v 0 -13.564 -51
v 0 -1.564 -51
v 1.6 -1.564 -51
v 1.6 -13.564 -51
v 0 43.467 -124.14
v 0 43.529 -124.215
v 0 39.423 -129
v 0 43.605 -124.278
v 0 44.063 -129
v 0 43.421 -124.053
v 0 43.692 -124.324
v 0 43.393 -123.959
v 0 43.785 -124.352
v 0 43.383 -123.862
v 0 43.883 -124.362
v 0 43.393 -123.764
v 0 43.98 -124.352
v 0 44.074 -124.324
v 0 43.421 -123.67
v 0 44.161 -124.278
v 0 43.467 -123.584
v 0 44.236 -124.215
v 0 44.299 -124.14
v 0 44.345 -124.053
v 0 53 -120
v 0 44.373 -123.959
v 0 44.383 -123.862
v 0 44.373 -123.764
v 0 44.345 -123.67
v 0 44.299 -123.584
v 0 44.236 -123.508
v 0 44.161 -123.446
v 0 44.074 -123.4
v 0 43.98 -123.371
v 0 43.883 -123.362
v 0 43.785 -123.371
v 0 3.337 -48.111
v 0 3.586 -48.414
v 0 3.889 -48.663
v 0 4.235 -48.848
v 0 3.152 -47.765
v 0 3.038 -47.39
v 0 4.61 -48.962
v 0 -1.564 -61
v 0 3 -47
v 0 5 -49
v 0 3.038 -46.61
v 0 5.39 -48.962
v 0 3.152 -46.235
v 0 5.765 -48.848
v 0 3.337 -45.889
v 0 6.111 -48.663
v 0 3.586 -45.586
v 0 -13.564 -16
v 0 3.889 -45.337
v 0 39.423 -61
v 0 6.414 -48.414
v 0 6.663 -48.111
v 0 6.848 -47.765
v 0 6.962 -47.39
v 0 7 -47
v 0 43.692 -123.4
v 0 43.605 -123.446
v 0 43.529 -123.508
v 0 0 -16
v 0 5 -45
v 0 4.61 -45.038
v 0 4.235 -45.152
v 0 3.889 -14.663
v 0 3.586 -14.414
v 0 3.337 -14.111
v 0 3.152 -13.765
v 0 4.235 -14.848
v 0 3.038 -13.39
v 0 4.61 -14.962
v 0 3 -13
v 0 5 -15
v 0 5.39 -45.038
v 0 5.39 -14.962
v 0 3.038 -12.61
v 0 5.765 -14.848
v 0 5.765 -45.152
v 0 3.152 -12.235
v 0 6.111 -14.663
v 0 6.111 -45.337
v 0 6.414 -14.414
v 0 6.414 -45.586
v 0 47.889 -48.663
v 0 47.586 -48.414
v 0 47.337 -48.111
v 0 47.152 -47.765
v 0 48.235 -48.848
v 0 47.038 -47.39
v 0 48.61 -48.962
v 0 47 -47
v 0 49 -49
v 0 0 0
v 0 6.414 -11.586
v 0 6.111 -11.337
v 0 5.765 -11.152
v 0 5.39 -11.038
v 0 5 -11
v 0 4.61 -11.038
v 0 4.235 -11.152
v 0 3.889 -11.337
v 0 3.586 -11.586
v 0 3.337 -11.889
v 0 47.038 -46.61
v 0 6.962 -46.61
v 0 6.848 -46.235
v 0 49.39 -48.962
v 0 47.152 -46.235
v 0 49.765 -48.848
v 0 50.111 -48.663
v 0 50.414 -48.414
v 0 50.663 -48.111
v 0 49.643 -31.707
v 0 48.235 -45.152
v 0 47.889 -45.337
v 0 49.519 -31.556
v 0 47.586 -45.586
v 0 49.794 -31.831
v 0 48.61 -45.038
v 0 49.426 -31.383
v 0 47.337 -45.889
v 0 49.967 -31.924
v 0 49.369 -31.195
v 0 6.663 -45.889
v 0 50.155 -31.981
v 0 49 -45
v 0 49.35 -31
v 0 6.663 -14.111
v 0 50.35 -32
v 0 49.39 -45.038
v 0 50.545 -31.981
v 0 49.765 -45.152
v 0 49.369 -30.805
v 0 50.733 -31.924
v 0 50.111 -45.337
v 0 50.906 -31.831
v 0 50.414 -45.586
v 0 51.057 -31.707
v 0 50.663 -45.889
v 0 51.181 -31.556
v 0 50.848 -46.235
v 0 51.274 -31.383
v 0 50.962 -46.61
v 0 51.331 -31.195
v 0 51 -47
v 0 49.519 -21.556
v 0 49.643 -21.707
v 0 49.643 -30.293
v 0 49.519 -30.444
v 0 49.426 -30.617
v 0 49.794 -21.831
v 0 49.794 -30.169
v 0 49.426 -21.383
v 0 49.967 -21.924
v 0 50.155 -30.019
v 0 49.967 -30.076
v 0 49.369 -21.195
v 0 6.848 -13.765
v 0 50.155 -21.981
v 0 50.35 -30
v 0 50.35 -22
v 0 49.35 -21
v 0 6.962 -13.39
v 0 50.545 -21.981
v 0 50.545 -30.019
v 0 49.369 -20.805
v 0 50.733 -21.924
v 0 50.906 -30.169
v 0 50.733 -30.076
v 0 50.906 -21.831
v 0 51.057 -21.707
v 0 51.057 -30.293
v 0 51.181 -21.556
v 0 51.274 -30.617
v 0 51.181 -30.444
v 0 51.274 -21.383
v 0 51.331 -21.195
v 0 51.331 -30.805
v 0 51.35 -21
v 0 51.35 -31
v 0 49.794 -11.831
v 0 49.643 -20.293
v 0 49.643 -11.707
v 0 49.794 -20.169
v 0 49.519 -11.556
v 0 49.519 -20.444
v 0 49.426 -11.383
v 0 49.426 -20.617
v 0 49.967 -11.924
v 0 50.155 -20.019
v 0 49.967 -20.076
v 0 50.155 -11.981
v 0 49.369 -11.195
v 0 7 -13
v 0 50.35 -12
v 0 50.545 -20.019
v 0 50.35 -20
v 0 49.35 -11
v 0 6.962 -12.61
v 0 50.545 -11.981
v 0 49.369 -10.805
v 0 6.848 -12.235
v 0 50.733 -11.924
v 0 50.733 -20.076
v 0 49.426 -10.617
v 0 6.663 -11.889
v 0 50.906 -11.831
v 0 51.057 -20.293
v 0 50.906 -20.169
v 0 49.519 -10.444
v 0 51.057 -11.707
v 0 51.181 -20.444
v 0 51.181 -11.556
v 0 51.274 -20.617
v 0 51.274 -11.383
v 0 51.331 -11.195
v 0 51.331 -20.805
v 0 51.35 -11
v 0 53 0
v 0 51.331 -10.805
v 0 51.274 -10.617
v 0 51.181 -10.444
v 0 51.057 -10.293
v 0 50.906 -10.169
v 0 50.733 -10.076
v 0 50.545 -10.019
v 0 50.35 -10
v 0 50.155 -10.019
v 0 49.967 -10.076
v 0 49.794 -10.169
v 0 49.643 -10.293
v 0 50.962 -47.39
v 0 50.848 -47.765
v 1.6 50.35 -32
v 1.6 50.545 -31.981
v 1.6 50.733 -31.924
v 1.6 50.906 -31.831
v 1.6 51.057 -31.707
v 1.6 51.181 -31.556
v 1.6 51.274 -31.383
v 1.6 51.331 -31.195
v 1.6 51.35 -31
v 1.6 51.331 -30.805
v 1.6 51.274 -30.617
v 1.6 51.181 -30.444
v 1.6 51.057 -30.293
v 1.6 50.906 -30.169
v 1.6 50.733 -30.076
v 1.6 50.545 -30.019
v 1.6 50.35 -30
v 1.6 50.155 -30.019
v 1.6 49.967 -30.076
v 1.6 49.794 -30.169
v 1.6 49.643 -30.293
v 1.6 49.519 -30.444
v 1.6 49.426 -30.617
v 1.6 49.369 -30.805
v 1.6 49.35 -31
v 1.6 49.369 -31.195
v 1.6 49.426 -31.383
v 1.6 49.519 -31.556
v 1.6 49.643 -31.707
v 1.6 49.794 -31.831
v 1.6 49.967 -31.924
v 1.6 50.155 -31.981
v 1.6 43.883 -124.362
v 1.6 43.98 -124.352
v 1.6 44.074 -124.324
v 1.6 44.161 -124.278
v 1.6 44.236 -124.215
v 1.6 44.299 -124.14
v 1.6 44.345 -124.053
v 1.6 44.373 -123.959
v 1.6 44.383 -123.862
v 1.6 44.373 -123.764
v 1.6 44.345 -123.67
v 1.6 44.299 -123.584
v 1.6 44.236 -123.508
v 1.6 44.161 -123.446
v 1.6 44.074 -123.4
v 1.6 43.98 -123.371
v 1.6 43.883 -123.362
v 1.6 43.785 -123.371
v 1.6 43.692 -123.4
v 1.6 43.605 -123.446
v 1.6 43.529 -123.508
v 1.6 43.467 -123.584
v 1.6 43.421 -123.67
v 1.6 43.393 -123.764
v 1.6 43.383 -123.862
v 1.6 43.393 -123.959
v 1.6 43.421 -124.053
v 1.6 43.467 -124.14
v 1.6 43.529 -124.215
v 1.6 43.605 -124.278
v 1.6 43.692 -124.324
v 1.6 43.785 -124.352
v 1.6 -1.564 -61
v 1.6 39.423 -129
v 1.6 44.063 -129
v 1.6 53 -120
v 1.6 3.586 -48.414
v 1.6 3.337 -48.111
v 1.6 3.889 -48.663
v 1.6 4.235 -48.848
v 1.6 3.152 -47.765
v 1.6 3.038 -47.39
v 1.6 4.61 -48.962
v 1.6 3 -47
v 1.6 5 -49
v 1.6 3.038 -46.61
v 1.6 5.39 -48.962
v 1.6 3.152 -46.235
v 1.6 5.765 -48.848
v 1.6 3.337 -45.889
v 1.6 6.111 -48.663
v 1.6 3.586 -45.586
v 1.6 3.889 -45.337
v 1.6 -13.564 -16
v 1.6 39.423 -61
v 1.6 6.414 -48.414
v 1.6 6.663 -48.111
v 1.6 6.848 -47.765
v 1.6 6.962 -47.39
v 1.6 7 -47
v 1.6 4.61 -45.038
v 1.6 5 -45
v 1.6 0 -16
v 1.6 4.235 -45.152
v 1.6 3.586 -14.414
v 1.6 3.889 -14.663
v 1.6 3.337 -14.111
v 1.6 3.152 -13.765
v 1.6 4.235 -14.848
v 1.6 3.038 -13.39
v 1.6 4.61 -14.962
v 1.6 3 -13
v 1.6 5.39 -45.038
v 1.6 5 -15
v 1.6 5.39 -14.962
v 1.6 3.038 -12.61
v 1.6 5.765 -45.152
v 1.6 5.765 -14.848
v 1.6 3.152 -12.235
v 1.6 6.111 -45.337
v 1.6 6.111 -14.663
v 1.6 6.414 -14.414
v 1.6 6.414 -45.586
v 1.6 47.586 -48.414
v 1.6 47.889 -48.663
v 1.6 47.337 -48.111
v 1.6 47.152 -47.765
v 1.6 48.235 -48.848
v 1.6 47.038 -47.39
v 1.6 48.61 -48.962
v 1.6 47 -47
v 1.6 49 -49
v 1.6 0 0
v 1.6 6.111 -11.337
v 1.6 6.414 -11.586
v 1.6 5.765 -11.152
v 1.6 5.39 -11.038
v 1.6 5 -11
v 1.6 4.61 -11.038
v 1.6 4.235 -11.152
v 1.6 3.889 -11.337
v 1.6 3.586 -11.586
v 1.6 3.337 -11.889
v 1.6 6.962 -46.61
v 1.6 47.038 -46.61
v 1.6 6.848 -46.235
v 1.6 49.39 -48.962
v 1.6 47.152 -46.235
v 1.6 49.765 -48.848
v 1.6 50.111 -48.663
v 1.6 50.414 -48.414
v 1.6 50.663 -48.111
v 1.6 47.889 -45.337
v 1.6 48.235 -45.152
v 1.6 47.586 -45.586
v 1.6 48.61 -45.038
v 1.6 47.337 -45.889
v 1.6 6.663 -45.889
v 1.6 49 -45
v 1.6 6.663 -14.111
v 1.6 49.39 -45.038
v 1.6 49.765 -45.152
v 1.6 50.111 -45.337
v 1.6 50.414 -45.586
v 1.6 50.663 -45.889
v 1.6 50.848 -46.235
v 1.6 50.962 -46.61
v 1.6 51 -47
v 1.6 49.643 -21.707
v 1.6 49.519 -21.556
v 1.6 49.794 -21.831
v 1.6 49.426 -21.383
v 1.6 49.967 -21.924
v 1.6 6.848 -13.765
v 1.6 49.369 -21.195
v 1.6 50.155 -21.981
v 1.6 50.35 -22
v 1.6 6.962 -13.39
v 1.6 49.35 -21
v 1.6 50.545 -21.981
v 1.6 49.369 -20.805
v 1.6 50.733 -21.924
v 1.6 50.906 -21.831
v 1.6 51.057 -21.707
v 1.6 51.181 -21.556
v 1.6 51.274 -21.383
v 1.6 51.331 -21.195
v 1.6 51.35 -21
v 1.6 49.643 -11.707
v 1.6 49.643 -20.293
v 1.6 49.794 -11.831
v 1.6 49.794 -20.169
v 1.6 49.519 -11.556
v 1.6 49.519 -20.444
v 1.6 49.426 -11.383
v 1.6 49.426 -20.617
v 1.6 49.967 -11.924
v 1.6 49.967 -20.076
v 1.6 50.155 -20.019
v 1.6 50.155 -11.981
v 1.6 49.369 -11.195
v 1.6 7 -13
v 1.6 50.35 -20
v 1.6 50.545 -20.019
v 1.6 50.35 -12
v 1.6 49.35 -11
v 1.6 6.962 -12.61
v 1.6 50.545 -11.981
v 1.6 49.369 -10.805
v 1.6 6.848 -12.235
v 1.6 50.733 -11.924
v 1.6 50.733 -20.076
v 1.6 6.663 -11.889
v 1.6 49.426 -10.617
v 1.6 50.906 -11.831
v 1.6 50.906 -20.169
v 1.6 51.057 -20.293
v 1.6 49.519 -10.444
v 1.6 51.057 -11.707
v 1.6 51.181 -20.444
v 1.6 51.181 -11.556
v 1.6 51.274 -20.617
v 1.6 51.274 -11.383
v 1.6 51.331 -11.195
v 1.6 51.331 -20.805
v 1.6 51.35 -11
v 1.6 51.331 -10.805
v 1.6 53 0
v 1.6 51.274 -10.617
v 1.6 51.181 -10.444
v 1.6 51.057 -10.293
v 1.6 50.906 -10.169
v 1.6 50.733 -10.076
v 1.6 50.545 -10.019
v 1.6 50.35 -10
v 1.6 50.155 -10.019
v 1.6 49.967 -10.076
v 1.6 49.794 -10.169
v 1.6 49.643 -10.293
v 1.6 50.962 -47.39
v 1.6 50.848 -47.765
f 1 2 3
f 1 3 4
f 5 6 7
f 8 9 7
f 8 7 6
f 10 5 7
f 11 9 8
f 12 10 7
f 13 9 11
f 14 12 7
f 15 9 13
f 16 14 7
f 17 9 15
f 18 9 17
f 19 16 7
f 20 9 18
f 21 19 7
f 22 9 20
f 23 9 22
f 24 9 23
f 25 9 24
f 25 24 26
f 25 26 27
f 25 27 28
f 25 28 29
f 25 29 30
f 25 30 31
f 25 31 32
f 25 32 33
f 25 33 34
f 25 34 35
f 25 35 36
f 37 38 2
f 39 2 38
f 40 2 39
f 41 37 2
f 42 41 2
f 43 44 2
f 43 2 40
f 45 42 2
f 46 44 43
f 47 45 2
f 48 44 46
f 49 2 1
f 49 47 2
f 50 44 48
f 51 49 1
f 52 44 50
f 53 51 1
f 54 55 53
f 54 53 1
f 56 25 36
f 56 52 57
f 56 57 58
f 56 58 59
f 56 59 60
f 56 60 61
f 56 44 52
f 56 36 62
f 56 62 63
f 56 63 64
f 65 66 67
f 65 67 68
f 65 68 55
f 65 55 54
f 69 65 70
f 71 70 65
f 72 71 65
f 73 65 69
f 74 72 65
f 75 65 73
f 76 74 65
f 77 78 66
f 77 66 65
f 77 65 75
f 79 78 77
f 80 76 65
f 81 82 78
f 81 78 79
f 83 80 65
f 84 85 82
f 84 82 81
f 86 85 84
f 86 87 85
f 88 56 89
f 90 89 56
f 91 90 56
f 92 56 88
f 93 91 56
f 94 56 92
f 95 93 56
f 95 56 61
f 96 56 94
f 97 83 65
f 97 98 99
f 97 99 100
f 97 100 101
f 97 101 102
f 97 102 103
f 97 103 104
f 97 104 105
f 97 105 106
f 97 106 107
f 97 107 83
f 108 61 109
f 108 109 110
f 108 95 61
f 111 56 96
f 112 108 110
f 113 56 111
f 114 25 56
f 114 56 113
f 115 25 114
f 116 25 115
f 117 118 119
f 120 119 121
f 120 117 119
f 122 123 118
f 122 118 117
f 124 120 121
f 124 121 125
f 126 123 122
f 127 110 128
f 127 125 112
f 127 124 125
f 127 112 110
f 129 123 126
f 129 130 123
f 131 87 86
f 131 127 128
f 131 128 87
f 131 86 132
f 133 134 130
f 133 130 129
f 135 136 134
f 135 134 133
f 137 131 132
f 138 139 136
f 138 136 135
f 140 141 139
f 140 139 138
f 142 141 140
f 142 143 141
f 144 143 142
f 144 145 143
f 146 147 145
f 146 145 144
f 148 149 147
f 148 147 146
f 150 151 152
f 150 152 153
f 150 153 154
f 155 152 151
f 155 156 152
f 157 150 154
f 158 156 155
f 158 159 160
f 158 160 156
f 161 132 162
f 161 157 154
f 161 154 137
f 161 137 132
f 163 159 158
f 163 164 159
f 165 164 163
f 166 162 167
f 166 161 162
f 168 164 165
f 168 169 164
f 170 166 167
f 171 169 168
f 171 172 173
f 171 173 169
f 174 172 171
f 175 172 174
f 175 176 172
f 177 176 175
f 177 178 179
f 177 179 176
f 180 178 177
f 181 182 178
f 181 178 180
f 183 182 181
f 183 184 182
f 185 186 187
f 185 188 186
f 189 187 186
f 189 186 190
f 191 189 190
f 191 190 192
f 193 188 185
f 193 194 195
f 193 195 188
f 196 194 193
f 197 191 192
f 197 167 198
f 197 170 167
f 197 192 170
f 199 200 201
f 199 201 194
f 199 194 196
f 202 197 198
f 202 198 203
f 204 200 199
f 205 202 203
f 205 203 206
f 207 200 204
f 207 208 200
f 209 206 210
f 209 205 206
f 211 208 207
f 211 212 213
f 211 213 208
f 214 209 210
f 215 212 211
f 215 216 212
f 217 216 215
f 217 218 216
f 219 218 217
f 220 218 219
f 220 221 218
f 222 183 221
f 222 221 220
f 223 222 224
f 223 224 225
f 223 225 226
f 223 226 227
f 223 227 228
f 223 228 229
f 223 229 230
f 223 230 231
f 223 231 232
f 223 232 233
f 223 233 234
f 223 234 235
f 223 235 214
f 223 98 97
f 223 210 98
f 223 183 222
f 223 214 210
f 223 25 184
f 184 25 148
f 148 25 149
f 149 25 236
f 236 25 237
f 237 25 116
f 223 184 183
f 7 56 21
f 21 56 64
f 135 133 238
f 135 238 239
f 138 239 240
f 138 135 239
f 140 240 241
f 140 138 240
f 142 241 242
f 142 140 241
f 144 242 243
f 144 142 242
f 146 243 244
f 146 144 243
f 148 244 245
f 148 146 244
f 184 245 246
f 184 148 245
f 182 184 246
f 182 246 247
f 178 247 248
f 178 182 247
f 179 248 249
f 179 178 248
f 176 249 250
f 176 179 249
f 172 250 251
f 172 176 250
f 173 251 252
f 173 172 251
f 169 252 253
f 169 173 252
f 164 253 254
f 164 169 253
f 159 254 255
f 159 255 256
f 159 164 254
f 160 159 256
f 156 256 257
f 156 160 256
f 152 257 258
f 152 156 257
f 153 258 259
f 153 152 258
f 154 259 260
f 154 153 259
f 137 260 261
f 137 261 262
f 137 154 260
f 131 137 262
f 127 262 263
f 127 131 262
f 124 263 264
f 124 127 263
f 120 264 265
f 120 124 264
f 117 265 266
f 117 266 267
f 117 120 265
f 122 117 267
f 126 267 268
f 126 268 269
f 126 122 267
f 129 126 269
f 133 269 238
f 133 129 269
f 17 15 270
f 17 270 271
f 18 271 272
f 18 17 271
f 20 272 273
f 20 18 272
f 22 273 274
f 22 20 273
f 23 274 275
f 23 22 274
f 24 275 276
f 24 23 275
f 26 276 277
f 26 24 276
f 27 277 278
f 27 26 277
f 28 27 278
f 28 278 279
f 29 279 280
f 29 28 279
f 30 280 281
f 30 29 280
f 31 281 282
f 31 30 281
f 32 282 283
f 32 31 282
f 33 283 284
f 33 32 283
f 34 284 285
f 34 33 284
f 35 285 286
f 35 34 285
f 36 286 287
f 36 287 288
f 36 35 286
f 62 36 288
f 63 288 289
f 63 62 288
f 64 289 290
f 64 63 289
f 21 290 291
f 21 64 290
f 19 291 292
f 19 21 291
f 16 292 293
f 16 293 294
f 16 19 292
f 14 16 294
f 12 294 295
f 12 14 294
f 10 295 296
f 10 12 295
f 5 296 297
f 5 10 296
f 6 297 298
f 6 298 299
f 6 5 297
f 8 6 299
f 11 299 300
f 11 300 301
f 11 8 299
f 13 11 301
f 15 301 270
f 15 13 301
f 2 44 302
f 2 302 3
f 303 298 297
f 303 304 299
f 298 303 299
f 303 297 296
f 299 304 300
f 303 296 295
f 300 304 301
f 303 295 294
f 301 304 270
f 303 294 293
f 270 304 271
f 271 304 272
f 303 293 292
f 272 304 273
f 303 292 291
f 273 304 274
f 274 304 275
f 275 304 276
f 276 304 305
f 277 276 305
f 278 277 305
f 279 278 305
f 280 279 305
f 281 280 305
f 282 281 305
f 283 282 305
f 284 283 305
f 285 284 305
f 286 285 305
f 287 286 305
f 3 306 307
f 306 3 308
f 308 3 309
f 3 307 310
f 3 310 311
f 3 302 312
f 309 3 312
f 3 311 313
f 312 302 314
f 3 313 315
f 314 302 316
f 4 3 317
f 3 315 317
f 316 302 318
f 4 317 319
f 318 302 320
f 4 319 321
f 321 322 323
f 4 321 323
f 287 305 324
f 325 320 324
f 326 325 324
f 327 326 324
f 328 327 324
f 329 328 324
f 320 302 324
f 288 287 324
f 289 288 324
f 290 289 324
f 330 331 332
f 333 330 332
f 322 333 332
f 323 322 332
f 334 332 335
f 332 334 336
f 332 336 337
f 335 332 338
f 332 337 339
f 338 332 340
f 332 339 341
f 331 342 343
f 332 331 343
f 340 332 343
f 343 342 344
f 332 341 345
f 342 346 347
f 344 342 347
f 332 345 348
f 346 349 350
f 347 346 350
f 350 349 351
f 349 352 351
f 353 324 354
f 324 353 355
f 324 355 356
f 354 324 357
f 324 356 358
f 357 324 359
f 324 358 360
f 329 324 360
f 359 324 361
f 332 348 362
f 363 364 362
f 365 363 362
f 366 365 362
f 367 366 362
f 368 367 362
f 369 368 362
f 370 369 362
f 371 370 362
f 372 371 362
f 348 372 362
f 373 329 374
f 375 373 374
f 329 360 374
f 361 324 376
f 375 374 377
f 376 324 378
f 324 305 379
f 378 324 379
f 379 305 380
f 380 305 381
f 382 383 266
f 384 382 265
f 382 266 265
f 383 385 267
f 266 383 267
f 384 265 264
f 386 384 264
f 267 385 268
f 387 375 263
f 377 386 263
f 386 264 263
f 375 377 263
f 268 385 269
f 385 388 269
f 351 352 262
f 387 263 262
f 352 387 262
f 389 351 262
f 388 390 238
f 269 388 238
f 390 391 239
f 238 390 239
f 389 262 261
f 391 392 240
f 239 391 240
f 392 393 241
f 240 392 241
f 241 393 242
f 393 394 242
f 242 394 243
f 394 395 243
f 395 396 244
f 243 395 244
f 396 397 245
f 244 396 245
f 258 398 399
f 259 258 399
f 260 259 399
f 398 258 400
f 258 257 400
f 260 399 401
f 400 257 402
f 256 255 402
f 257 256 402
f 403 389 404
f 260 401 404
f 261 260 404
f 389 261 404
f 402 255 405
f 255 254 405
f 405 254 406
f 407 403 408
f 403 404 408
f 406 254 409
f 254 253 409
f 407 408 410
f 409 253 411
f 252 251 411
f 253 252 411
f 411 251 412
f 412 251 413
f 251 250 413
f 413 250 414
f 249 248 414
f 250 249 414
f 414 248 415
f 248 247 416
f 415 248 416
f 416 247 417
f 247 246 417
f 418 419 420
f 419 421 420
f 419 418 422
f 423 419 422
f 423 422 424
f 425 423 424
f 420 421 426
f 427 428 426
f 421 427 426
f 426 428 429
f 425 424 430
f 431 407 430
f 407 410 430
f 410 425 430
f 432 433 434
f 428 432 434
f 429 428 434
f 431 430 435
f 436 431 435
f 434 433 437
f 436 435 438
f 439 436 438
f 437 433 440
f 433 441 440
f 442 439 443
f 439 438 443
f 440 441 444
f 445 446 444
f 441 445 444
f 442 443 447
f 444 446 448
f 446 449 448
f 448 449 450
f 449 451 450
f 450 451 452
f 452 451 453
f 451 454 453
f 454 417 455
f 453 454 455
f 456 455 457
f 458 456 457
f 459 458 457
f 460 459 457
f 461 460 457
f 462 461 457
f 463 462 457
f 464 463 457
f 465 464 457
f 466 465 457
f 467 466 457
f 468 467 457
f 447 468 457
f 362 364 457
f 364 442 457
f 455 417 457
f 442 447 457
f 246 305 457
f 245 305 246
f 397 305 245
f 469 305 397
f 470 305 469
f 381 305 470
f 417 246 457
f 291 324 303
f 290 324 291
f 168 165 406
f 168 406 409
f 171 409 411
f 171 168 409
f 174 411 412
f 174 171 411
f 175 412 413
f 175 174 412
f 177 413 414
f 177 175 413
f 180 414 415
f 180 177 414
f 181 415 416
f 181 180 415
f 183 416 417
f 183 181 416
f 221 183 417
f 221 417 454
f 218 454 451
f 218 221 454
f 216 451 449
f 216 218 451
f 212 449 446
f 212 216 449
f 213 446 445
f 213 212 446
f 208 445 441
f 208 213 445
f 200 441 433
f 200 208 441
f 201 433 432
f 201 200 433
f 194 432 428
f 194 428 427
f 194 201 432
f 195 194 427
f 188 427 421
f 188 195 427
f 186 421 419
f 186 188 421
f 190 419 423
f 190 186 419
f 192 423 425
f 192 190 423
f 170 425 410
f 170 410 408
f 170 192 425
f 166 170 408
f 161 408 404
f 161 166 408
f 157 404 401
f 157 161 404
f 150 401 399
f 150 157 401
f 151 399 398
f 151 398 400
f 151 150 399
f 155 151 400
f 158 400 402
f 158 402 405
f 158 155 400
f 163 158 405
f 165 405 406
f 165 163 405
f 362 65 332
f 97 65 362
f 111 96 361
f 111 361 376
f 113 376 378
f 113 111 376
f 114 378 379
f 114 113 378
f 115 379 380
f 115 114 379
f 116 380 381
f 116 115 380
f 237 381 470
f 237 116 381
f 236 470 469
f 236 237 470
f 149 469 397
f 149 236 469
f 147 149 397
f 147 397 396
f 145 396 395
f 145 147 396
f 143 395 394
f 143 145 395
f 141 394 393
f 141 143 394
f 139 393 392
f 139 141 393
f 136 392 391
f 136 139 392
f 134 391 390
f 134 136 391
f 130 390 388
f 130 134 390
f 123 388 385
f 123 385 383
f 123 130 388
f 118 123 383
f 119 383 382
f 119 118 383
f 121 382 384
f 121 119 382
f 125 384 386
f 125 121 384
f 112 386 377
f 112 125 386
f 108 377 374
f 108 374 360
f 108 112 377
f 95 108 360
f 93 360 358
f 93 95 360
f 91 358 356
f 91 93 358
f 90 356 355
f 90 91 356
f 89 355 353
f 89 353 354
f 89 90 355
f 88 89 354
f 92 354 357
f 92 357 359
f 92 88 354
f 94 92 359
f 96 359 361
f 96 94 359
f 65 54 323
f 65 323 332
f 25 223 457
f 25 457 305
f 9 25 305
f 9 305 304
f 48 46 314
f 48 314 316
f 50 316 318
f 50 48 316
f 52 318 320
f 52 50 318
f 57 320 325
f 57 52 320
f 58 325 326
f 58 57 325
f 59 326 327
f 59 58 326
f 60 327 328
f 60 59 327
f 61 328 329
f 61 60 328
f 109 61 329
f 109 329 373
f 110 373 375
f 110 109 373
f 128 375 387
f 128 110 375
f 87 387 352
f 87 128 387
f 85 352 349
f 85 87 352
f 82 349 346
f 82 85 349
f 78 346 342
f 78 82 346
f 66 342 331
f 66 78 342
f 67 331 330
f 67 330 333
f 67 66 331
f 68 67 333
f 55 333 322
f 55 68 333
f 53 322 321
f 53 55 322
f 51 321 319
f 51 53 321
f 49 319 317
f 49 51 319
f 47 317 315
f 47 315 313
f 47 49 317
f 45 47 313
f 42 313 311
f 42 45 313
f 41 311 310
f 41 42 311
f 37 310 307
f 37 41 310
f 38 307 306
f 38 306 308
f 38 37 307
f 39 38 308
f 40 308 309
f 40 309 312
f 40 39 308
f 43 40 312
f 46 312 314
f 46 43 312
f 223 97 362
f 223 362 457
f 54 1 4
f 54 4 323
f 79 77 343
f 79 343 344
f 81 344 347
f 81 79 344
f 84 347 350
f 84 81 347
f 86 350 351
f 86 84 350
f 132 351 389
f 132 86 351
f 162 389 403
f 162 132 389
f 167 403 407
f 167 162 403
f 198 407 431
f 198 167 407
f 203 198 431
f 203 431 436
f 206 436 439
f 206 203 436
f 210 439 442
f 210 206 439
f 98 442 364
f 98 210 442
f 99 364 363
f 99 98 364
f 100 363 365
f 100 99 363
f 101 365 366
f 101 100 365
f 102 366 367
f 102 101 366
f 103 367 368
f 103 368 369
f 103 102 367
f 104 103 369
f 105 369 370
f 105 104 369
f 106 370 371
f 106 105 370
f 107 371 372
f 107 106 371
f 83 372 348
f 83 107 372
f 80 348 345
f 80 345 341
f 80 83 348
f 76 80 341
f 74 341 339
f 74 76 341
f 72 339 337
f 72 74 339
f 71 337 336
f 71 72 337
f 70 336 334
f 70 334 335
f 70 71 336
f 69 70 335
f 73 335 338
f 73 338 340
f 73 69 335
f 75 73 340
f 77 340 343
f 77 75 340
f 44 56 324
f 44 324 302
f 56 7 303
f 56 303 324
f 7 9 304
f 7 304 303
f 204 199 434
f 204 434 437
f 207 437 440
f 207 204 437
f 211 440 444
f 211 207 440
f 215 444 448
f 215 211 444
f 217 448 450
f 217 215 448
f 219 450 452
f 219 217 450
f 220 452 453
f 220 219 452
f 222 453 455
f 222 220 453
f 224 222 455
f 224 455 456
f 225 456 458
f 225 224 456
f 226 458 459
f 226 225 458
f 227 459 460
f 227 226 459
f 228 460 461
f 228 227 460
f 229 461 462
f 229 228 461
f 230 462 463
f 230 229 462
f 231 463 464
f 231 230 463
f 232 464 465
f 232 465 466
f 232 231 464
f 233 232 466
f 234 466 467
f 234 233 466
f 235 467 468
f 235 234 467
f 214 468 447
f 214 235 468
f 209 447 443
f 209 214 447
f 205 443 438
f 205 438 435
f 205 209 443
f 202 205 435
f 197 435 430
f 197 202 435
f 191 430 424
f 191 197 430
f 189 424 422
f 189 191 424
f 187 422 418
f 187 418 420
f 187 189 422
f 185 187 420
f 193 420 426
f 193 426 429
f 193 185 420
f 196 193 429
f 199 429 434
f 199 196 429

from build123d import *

# Parameters (mm, degrees)
SKETCH1_R           = 2
SKETCH1_R_2         = 1
SKETCH1_R_3         = 0.5
BOSS_EXTRUDE1_DEPTH = 1.6


with BuildPart() as part:
    # Sketch1 → Boss-Extrude1 (new body)
    with BuildSketch(Plane(origin=(0, 0, 0), x_dir=(0, 0, -1), z_dir=(1, 0, 0))):
        Polygon((0, 0), (0, 53), (120, 53), (129, 44.063430305), (129, 39.423430305), (61, 39.423430305), (61, -1.563926021), (51, -1.563926021), (51, -13.563926021), (16, -13.563926021), (16, 0), align=None)
        with Locations((13, 5)):
            Circle(SKETCH1_R, mode=Mode.SUBTRACT)
        with Locations((47, 5)):
            Circle(SKETCH1_R, mode=Mode.SUBTRACT)
        with Locations((47, 49)):
            Circle(SKETCH1_R, mode=Mode.SUBTRACT)
        with Locations((11, 50.35)):
            Circle(SKETCH1_R_2, mode=Mode.SUBTRACT)
        with Locations((21, 50.35)):
            Circle(SKETCH1_R_2, mode=Mode.SUBTRACT)
        with Locations((31, 50.35)):
            Circle(SKETCH1_R_2, mode=Mode.SUBTRACT)
        with Locations((123.861808856, 43.882900864)):
            Circle(SKETCH1_R_3, mode=Mode.SUBTRACT)
    extrude(amount=BOSS_EXTRUDE1_DEPTH)


solid = part.part
